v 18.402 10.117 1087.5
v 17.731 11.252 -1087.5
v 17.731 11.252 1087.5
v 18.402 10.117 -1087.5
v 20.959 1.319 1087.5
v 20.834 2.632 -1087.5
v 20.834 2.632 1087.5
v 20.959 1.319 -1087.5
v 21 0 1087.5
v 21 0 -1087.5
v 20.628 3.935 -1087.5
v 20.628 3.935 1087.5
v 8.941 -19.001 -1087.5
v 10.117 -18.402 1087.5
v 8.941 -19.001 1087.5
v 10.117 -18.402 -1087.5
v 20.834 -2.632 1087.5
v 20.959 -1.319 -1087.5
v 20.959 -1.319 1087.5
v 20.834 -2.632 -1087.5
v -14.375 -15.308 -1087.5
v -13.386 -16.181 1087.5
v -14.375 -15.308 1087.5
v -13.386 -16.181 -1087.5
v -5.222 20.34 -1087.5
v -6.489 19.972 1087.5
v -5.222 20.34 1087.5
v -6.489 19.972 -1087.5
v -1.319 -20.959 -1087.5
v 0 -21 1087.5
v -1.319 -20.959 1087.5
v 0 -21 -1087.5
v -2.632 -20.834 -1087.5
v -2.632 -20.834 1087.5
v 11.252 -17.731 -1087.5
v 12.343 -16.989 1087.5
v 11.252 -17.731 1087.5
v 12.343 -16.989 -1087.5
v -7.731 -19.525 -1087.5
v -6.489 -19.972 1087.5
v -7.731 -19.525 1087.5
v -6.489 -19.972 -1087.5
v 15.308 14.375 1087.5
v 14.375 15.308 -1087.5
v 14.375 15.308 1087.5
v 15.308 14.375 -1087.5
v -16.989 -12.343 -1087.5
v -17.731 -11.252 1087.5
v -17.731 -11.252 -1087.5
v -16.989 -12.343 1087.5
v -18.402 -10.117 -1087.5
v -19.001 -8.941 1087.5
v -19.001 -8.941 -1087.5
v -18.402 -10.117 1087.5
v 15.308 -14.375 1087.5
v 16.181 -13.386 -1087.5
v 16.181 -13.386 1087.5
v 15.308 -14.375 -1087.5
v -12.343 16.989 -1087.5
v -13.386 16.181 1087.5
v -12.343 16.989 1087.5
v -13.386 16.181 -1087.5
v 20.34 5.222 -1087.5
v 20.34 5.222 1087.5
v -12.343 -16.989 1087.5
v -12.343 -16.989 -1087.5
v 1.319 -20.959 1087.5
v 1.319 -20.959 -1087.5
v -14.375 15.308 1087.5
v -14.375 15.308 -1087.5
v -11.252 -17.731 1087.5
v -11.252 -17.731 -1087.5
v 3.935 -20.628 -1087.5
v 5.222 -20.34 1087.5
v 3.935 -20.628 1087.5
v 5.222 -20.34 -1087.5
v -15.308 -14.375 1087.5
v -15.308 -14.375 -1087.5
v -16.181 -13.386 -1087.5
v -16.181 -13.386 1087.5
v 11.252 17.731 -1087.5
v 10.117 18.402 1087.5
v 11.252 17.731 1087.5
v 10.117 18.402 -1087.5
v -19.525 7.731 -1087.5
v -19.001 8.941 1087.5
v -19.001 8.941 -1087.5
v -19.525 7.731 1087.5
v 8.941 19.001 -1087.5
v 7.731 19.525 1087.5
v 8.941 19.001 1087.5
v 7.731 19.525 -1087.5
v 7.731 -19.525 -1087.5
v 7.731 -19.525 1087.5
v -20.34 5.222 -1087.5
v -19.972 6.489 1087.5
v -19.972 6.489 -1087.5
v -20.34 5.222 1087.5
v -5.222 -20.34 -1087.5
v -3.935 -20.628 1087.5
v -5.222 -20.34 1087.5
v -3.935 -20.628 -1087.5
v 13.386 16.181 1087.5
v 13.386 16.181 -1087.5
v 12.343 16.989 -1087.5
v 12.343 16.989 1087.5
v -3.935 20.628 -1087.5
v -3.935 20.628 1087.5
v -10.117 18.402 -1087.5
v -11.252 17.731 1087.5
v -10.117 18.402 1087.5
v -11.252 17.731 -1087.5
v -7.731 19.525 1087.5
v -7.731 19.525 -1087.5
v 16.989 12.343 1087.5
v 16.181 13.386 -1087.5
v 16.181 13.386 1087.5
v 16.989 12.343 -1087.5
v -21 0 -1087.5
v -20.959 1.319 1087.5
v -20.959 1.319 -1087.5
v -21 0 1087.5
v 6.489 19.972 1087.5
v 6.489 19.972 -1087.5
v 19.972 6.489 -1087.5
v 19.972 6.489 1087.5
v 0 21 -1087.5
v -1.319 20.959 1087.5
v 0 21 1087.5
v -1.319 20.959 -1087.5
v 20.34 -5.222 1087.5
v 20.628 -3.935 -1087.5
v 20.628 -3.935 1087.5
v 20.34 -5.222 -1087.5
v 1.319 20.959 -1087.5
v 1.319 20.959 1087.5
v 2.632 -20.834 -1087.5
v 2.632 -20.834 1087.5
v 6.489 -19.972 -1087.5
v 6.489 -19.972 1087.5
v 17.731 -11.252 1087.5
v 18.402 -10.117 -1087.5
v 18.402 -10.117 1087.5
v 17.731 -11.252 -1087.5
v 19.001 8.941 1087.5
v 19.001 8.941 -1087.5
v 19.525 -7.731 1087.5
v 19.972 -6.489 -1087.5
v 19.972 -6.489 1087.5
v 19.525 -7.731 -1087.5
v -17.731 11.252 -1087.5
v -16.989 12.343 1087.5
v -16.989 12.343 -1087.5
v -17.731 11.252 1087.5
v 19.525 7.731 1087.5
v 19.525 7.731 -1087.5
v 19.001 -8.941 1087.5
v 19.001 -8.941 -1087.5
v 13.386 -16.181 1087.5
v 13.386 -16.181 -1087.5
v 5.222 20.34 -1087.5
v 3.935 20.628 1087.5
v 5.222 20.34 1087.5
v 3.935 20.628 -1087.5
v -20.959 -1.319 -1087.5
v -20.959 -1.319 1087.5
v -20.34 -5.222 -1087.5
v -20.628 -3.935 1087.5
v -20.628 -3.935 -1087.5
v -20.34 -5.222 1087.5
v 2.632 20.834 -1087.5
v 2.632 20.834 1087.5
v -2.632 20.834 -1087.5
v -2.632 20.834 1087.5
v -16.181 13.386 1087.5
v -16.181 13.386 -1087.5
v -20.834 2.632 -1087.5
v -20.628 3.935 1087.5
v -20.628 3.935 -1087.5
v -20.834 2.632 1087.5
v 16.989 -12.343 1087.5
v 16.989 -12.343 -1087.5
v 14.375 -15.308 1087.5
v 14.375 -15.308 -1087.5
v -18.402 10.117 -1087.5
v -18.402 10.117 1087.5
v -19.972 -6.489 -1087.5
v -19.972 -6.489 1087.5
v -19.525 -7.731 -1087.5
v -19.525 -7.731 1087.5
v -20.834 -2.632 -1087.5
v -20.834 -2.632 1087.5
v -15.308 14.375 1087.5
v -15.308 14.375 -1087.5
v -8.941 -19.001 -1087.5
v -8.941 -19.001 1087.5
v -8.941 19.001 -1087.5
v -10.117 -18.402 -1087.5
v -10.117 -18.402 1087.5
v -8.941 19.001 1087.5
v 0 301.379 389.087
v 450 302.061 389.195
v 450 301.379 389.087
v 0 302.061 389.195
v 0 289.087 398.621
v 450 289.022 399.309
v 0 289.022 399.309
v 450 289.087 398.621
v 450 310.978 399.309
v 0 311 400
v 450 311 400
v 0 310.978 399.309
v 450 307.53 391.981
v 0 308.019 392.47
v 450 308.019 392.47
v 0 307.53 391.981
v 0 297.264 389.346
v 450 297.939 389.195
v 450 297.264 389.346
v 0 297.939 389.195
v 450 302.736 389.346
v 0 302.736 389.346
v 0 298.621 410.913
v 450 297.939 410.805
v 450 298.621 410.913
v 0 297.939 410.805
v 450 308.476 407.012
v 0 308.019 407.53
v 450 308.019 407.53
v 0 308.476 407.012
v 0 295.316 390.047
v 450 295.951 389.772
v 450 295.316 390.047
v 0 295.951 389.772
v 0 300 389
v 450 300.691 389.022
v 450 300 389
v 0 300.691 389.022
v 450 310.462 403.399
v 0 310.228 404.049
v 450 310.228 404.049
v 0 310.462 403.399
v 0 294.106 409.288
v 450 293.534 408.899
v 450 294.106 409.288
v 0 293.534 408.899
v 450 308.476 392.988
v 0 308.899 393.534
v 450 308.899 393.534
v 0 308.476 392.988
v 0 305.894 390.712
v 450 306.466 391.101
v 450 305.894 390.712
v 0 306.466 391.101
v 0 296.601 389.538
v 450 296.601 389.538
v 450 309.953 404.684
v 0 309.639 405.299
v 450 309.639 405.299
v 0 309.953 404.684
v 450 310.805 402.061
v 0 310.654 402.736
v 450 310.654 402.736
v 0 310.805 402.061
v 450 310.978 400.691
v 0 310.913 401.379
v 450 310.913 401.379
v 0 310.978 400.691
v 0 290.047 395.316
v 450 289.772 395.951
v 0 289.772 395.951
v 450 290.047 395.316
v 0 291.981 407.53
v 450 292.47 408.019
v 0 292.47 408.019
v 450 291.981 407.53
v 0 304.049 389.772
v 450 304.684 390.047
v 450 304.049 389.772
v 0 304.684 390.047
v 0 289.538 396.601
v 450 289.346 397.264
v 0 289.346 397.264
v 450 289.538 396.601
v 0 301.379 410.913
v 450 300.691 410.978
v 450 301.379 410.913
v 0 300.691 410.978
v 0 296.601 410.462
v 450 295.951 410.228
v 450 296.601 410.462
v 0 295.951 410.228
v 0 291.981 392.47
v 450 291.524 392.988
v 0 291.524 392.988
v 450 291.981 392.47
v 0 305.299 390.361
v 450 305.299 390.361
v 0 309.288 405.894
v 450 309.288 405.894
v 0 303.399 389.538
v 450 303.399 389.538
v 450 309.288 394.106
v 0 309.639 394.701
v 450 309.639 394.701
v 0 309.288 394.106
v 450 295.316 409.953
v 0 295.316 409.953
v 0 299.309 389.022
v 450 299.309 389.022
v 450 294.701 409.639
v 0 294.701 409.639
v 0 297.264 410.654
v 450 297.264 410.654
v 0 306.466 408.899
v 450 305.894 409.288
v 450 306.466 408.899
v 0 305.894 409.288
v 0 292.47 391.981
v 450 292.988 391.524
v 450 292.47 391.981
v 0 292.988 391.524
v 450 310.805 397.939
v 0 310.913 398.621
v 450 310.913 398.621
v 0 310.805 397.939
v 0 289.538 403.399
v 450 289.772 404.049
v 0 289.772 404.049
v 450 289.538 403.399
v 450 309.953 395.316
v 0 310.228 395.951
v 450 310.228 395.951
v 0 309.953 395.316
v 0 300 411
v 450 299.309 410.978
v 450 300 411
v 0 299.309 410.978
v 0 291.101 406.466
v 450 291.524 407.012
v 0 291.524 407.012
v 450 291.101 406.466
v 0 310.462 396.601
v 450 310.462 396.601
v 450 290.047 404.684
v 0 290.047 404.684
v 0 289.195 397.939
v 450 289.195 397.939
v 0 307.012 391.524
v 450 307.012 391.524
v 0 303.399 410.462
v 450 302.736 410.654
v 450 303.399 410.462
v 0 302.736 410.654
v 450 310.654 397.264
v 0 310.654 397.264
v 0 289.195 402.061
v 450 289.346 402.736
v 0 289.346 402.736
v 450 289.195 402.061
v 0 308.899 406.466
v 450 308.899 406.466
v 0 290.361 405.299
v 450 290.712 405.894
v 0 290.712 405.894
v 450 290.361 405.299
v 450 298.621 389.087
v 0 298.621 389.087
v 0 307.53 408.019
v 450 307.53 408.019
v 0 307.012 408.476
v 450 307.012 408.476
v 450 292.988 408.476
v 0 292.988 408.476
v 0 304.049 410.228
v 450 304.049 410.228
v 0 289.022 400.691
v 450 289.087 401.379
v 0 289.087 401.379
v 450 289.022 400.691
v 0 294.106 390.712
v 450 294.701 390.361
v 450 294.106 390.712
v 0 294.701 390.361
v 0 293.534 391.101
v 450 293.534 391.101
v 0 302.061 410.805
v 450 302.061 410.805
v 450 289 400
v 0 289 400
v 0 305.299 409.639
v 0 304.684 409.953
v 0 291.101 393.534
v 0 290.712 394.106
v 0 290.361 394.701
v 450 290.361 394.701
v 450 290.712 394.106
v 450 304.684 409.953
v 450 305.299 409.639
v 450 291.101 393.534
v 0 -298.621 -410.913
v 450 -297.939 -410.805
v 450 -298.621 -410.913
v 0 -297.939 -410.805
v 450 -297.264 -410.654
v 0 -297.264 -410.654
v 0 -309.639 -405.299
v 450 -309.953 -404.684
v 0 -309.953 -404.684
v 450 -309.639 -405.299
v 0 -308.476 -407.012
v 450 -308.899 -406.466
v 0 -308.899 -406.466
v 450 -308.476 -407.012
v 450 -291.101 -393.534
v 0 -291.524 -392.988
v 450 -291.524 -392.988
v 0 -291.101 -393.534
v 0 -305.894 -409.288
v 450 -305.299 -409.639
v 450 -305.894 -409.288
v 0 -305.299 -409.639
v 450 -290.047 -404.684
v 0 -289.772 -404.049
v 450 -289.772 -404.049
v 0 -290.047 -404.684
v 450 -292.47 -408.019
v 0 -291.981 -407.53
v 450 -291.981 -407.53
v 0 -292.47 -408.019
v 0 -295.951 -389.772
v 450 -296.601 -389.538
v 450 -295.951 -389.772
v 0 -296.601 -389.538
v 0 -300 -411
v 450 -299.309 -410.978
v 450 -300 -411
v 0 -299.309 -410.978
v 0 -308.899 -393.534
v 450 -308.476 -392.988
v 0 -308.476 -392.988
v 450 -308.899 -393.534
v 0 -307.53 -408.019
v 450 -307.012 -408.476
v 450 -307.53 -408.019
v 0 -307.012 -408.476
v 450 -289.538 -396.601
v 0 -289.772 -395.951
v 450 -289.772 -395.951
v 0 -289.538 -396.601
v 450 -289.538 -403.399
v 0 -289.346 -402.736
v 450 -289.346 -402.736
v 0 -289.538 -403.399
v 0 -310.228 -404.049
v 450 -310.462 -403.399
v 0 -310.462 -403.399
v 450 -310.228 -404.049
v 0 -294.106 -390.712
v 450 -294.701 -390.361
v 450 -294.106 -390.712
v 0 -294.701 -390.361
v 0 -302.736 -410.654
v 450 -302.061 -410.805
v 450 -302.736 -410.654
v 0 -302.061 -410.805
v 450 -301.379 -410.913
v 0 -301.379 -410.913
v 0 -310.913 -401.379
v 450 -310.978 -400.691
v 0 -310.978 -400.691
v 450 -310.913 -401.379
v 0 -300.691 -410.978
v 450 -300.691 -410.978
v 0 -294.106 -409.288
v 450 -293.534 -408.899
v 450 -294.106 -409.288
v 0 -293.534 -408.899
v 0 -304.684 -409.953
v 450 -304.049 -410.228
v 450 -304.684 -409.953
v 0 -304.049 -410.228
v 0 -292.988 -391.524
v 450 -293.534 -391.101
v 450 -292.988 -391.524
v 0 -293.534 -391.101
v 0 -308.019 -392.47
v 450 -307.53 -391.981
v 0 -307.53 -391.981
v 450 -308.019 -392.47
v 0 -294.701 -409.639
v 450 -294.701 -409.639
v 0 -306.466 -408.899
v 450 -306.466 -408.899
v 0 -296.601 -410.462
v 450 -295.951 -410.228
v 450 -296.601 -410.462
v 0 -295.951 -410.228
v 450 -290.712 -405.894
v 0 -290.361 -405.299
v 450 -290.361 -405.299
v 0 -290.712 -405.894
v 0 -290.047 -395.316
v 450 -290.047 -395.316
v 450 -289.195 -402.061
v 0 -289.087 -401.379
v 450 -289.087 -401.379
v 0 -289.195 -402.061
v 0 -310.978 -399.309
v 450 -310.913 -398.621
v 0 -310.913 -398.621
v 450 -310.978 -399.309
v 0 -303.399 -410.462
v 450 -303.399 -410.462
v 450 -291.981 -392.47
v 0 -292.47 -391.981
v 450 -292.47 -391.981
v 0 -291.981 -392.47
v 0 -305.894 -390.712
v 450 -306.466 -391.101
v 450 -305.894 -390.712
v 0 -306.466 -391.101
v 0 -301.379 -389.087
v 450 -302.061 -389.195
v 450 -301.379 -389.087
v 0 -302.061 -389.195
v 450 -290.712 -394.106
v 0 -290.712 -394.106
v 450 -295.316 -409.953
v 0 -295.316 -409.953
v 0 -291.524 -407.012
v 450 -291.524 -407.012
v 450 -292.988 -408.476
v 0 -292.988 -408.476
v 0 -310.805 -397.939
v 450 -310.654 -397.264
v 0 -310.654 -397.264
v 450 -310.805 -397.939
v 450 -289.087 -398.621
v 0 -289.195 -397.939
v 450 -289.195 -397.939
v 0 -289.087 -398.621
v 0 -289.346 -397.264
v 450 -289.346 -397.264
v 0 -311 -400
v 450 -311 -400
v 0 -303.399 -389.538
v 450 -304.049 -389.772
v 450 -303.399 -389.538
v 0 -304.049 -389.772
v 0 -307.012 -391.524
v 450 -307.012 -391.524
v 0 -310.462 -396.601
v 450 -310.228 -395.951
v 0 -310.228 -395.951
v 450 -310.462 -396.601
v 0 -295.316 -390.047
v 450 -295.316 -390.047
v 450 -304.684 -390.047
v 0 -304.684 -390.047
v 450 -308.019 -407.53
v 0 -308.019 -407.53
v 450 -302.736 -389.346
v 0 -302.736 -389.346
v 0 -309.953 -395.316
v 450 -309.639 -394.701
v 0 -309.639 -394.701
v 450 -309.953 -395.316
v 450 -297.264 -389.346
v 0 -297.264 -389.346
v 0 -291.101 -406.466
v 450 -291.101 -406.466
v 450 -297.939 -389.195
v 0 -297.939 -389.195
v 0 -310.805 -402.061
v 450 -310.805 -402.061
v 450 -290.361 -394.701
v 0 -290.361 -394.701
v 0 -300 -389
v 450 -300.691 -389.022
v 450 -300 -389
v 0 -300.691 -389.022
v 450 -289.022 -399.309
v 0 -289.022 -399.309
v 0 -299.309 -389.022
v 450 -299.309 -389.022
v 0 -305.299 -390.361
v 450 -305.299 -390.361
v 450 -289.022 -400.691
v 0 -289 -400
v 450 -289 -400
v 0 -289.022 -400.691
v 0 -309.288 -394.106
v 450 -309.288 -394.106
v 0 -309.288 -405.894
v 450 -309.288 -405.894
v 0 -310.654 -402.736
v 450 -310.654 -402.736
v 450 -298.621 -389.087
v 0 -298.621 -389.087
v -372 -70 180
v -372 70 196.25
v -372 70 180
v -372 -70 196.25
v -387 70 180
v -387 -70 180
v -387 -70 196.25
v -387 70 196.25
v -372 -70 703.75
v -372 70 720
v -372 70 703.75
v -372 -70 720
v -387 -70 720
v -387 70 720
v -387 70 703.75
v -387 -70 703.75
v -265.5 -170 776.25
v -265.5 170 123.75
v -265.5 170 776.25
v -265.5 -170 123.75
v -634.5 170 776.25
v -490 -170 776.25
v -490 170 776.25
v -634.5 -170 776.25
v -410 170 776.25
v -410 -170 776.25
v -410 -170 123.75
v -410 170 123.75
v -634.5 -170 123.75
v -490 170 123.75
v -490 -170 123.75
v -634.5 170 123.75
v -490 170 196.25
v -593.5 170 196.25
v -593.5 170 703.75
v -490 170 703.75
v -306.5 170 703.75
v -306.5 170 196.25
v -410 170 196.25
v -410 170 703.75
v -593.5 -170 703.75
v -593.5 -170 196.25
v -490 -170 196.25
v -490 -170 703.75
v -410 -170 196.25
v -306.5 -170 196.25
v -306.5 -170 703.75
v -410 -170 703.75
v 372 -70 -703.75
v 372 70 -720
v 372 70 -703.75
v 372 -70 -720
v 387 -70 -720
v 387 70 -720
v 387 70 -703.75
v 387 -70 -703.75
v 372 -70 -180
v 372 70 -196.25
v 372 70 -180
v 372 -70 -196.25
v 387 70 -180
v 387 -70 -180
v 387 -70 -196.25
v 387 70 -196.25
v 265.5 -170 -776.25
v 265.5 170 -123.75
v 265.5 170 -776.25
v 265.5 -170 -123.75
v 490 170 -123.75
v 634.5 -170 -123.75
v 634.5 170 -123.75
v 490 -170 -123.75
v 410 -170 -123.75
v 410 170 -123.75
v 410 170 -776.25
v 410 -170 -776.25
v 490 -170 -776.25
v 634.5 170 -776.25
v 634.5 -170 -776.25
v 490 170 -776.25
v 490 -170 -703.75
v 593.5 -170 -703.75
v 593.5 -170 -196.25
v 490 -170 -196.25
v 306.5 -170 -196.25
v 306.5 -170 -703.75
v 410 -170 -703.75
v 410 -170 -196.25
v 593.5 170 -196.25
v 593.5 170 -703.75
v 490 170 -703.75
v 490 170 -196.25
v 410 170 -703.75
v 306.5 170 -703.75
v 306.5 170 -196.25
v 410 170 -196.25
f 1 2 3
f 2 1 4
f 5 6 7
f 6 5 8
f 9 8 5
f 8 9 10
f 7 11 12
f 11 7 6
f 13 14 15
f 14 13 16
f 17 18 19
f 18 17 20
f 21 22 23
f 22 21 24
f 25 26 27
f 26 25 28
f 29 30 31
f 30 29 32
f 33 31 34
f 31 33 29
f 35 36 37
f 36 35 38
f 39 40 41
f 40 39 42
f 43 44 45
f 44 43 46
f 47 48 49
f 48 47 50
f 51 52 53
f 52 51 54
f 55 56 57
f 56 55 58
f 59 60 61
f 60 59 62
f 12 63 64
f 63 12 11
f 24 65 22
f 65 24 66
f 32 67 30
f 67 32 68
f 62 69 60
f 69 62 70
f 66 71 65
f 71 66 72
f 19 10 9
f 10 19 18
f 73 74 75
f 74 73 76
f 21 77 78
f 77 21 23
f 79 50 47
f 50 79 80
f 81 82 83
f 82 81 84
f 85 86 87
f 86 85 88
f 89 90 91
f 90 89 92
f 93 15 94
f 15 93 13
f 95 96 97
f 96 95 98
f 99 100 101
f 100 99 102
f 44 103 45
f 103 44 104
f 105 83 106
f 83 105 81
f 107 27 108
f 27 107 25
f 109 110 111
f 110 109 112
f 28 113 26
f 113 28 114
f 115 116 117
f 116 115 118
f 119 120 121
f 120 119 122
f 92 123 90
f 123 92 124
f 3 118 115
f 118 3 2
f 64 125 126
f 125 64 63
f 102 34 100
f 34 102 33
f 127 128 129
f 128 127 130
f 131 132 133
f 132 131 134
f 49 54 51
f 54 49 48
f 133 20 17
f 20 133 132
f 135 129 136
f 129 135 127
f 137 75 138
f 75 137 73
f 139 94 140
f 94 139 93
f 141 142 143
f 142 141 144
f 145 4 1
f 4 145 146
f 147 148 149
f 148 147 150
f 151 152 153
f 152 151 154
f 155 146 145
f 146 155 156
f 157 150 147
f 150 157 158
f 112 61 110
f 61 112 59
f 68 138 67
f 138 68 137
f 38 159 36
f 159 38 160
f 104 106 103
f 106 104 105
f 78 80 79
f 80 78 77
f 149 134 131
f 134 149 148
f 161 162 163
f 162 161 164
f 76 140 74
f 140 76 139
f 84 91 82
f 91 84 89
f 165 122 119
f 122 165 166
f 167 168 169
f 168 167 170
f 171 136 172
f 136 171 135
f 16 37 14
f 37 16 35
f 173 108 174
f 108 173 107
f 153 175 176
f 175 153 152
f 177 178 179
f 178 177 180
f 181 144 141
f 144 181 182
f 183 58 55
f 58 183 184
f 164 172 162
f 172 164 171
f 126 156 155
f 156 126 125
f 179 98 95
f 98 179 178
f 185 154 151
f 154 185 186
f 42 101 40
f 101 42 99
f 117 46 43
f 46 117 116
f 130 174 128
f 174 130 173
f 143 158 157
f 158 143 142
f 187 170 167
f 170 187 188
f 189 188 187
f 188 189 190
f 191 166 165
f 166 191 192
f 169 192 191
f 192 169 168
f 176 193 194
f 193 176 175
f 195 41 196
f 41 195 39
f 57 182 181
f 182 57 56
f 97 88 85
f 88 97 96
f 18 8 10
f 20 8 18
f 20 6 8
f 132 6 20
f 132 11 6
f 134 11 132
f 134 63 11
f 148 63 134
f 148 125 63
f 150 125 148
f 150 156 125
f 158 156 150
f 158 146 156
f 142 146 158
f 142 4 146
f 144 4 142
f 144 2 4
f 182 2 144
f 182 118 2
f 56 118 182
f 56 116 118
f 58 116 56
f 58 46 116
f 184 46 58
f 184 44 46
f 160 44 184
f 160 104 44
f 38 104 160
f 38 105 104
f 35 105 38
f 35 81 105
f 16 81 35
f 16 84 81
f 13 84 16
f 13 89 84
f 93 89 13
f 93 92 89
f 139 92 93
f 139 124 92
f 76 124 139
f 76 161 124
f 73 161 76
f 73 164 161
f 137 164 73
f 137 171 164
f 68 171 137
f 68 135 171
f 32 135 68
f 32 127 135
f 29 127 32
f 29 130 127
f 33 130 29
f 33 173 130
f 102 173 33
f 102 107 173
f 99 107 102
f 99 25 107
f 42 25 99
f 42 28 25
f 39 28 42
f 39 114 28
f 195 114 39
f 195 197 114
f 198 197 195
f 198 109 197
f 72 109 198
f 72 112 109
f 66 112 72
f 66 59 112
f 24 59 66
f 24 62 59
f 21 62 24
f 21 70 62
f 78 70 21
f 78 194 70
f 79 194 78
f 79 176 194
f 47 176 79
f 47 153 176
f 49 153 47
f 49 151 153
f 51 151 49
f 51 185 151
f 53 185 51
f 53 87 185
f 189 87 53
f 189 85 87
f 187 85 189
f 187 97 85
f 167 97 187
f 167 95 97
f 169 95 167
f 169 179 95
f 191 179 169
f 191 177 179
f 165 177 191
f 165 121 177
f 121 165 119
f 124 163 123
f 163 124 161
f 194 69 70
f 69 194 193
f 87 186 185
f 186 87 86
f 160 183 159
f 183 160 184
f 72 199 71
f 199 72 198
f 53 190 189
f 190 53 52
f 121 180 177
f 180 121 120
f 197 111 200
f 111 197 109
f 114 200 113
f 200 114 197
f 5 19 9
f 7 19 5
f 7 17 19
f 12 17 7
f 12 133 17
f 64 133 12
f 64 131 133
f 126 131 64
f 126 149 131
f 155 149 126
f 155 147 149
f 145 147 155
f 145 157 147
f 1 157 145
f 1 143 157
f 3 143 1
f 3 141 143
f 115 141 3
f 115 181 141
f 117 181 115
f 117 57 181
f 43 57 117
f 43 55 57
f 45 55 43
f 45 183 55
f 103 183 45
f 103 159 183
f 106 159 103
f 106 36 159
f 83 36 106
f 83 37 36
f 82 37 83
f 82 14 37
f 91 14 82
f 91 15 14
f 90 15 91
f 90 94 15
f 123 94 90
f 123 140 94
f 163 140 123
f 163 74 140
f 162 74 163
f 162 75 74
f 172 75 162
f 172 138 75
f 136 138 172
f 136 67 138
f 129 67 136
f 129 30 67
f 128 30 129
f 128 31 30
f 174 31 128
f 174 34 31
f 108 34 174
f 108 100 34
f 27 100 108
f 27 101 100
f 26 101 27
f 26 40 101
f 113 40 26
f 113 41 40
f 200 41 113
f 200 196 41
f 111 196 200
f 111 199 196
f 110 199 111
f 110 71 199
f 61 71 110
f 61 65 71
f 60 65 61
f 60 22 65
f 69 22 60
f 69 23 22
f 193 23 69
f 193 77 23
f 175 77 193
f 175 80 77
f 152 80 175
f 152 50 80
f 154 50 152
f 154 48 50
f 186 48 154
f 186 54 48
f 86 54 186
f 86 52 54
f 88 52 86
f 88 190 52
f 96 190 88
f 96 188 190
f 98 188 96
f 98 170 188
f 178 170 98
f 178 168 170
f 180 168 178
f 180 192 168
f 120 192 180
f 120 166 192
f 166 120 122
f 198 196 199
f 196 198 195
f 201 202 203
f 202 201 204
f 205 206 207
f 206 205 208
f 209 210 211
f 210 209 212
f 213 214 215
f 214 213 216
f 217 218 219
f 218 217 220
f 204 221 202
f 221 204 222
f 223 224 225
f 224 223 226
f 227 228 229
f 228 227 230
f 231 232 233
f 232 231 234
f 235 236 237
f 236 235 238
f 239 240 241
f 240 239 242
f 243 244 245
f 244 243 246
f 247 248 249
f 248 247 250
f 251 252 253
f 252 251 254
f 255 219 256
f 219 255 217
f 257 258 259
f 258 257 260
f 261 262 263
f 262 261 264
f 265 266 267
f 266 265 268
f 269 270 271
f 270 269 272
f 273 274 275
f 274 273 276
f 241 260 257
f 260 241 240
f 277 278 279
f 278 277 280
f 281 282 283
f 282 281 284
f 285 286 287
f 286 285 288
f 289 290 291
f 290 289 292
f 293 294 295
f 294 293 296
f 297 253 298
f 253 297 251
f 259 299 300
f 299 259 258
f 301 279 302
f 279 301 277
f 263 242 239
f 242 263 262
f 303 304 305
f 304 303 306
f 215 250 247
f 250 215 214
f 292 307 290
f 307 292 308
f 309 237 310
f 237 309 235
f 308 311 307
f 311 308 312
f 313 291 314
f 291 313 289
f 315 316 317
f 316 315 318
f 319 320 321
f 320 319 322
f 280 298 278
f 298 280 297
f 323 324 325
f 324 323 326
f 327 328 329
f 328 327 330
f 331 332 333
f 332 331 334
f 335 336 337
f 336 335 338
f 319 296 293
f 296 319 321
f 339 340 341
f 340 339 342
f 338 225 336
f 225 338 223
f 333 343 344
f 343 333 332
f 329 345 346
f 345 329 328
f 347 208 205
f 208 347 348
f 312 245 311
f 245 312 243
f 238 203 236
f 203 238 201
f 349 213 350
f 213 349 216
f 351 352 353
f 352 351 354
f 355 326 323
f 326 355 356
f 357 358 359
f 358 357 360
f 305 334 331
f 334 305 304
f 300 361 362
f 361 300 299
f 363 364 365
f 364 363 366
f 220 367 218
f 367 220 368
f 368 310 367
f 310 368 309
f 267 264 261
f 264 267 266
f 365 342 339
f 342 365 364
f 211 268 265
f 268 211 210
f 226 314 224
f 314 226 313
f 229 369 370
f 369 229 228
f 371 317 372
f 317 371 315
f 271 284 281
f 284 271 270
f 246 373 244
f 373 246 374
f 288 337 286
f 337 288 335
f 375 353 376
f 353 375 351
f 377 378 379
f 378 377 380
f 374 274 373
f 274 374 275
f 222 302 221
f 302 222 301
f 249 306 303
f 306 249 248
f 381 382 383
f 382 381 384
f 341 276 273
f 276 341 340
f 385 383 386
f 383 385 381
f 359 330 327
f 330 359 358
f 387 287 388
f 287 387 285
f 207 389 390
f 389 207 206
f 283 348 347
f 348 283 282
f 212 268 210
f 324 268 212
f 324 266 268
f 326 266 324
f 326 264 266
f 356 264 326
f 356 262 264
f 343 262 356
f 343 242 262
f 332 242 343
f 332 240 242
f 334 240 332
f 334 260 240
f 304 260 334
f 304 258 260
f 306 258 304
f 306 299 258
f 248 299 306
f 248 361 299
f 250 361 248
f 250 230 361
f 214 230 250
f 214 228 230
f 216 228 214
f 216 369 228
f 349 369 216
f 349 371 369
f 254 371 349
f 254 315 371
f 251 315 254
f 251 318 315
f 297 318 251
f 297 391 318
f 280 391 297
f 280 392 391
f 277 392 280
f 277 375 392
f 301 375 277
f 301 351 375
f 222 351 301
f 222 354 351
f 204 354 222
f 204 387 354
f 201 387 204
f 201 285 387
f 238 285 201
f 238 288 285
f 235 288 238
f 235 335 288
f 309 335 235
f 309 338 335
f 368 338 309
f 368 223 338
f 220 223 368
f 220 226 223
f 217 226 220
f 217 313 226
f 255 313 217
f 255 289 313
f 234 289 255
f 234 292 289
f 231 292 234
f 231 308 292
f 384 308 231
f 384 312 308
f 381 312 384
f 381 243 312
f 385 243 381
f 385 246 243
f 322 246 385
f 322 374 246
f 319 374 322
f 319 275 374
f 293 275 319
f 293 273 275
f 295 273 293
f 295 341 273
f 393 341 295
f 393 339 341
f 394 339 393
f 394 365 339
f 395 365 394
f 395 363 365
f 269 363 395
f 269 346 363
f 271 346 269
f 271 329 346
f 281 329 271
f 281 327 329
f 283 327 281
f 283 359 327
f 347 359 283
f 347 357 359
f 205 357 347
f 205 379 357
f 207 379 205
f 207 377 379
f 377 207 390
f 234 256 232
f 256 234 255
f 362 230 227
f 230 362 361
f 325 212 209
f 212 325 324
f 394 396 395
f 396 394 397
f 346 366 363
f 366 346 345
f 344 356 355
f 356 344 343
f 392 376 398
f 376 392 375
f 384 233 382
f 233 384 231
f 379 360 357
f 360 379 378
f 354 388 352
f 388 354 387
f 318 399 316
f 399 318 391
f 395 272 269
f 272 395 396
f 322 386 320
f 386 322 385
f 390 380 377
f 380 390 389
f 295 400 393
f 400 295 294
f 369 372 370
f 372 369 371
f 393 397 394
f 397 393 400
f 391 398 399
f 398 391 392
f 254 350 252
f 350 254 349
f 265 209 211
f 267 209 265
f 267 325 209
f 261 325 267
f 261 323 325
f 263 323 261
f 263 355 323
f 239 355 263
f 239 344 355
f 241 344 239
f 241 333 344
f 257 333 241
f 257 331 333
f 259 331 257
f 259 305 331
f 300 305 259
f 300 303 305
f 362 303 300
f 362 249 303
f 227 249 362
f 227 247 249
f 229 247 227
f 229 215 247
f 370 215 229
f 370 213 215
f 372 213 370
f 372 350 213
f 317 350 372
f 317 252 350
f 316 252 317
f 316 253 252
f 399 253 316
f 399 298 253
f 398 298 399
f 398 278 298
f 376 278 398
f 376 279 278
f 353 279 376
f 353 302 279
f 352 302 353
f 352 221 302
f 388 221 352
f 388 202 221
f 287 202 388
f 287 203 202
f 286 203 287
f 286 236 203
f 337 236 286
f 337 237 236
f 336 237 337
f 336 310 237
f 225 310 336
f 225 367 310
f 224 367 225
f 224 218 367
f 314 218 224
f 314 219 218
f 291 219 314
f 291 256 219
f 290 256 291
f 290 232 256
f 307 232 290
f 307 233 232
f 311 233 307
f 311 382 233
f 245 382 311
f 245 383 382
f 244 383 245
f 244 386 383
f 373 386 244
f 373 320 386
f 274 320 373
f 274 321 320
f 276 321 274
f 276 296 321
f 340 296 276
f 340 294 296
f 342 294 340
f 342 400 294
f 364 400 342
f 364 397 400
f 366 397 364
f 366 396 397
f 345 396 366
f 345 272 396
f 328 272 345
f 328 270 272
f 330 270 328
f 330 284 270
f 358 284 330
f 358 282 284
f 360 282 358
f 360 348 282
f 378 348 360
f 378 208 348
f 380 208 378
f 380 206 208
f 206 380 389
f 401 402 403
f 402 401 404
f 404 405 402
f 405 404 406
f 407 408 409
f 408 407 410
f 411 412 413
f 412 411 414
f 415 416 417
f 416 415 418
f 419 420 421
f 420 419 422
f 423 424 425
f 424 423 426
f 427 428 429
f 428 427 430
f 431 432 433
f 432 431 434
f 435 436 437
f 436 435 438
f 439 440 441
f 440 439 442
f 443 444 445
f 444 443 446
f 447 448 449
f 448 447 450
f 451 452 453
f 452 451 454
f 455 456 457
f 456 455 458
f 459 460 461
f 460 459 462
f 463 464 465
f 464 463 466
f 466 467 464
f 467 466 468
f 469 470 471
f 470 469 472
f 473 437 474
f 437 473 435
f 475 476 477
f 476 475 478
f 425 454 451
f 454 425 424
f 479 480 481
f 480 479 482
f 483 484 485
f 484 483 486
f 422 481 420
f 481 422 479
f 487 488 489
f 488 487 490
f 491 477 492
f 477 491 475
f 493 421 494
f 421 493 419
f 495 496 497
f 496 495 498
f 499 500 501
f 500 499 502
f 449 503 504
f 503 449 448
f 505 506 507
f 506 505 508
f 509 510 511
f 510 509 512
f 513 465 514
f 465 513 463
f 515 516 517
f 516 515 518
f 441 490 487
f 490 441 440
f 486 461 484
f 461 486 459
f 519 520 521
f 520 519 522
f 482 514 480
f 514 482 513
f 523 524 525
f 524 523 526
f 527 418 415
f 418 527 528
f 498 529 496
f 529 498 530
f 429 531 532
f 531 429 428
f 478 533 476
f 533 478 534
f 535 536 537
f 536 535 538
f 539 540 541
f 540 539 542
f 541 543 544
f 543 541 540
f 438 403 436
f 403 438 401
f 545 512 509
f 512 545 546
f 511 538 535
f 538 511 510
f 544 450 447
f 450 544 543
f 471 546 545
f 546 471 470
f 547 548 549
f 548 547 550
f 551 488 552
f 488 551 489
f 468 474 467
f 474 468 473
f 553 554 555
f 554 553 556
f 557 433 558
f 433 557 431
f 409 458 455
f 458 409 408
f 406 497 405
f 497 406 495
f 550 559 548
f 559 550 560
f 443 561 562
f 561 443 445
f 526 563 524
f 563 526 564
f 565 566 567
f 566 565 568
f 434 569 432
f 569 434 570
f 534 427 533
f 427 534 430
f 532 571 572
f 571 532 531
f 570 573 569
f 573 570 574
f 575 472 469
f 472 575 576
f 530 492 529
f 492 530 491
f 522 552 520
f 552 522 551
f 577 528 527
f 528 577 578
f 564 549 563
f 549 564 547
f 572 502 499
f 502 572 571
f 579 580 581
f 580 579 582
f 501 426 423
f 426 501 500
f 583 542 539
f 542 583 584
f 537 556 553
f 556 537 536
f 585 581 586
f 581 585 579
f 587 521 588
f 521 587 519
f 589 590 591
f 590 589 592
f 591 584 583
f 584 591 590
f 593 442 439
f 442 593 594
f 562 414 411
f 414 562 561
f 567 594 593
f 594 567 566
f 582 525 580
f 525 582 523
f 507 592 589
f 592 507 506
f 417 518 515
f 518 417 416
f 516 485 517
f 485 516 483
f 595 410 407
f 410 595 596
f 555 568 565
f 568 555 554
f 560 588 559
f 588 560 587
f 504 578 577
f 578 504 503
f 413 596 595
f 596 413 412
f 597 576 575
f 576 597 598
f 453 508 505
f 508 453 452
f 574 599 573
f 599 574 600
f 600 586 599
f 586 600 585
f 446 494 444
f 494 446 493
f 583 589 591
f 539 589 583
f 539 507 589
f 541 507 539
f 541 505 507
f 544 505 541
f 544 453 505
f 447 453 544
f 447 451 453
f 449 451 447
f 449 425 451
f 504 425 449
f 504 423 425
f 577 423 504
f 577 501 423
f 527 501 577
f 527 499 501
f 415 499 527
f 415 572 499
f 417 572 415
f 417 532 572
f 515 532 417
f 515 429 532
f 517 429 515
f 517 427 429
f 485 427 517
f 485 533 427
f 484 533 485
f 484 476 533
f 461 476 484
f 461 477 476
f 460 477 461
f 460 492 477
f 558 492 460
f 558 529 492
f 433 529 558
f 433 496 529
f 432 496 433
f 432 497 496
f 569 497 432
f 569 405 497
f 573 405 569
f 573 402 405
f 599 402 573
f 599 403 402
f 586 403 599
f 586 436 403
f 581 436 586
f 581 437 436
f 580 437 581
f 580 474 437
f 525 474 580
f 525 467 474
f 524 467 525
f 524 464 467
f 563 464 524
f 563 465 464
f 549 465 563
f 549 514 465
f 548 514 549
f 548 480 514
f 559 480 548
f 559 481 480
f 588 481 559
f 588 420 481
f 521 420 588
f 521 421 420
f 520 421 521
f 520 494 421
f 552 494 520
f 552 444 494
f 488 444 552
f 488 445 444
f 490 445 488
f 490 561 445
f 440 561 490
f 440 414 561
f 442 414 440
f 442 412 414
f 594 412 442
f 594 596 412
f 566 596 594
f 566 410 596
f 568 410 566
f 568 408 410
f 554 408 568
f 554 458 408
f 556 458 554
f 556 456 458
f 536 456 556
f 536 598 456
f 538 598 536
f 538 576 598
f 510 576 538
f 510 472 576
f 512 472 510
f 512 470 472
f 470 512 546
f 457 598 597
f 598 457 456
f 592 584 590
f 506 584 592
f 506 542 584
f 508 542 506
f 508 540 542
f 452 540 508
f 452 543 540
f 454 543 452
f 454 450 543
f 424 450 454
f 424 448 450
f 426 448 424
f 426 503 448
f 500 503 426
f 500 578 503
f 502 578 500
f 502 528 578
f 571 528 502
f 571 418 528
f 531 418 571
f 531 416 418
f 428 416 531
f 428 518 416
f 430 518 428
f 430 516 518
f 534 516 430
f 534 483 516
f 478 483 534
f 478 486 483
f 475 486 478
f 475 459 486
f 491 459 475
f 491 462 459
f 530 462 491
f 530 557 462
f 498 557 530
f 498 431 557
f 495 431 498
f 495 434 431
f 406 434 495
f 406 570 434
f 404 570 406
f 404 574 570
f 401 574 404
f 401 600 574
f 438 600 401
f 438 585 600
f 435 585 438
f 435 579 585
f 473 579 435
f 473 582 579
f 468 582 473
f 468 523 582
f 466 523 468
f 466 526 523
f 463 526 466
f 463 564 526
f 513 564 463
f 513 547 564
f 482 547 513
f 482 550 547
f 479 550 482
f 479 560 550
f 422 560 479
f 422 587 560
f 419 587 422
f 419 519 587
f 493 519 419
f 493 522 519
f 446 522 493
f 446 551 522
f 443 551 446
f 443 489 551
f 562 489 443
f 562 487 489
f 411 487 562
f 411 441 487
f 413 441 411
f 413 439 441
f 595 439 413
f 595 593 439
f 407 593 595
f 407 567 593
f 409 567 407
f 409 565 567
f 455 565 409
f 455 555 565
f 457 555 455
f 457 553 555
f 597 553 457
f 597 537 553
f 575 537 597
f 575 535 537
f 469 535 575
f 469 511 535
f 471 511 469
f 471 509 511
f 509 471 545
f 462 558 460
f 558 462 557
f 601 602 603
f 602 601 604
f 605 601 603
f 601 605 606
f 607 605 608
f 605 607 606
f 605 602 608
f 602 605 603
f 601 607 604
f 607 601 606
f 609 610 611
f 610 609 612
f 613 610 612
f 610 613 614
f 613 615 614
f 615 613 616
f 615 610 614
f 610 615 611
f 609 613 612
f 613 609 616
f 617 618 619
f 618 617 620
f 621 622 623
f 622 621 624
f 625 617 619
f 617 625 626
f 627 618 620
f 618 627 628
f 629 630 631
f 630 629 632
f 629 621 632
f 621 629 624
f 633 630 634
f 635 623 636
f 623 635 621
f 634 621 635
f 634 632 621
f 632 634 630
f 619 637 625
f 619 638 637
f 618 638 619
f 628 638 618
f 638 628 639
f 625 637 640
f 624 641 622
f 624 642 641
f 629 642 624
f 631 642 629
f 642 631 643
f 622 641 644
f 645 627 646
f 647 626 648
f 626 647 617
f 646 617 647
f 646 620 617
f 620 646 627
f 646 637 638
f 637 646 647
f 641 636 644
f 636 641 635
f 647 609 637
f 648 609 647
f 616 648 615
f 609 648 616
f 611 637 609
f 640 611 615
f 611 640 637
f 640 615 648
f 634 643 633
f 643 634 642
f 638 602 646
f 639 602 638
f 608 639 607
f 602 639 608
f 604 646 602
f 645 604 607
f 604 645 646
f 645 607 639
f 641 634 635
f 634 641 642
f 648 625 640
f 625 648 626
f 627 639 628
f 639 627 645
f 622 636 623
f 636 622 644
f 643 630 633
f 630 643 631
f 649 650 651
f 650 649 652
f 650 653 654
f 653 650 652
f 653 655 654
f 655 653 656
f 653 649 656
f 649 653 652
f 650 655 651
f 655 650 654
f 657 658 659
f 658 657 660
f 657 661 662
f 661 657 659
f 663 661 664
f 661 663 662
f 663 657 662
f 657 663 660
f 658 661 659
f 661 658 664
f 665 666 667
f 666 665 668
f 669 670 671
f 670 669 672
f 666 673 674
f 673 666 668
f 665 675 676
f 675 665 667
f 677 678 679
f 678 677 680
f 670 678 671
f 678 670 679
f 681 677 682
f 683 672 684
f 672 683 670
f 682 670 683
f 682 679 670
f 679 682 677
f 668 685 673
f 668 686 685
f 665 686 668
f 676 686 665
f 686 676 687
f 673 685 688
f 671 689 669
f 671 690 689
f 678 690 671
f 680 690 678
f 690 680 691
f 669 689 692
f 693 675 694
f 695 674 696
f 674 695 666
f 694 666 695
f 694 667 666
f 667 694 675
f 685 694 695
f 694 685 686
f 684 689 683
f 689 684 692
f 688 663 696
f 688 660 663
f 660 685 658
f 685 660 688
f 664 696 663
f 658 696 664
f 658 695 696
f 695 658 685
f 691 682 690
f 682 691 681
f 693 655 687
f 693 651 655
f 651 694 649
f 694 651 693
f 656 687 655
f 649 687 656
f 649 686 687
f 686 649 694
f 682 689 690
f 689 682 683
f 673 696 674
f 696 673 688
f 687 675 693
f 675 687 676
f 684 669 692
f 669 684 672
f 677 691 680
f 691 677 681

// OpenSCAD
// ============================================================================
// PROJECT: XXXG-00W0 WING GUNDAM ZERO EW - LOWER AIRFRAME PROTECTION
// COMPONENT VAULT: BANDAI CAST RUNNER G - PELVIC ANCHORS G19 & G20
// PACKAGING RE-ARCHITECTURE: SUB-ARMOR CAPACITOR RECESSED BANK INTEGRATION
// CONFIG METRIC: SCALED TITANIUM CASTS (1:1 ACTUAL METRIC UP-SCALE)
// ============================================================================

$fn = 100; // Circular segment rendering resolution count

// Structural Constants Scaled 1:1 for a 16.7-Meter Airframe Scale (mm)
pelvic_plate_length = 1450;             // Total longitudinal vertical height (mm)
pelvic_outer_width = 820;               // Transverse pelvic shell casing depth (mm)
armor_skin_thickness = 60;              // Solid TiAl protective plating wall (mm)
harness_conduit_width = 80;             // Cast-in 4oz copper logic trace track (mm)
capacitor_pocket_depth = 15;            // Sub-armor recessed housing pocket depth (mm)
capacitor_pocket_width = 140;           // Transverse MLCC array pocket width (mm)

module Runner_G_Pelvic_Anchor_Forge() {
    // Central Supply Injection Runner Axis (Molten Feed Line from Siphon Forge)
    color([0.22, 0.22, 0.25]) {
        cylinder(h = pelvic_plate_length * 1.5, d = 42, center = true);
        // Direct injection gates tracking straight into the part mold cavities
        translate([0, 300, 400]) rotate([0, 90, 0]) cylinder(h = 450, d = 22);
        translate([0, -300, -400]) rotate([0, 90, 0]) cylinder(h = 450, d = 22);
    }
    
    // Instantiate Scaled Skeutomorphic Part Molds Symmetrically (Left & Right)
    Cast_Internal_Pelvic_Anchors();
}

module Cast_Internal_Pelvic_Anchors() {
    // ---- PART G19: INTERNAL LEFT PELVIC LOAD PLATE ANCHOR ---- [Page 18, Step 09-1]
    translate([-450, 0, 450]) color([0.35, 0.35, 0.38]) { // Inner Frame Dark Spec
        difference() {
            // Main solid heavy-duty lower frame stabilization anchor block
            cube([pelvic_outer_width * 0.45, 340, pelvic_plate_length * 0.45], center = true);
            
            // Core structural cut out for internal backbone link mounting
            cube([pelvic_outer_width * 0.35, 360, pelvic_plate_length * 0.35], center = true);
            
            // SUB-ARMOR RECESSED CAPACITOR POCKETS [Segmented rows cut inside the anchor wall]
            for (z_offset = [-200, 0, 200]) {
                translate([(pelvic_outer_width * 0.15 - armor_skin_thickness + capacitor_pocket_depth/2), 0, z_offset])
                    cube([capacitor_pocket_depth, capacitor_pocket_width, 140], center = true);
            }
            
            // Continuous cast-in routing track for the 4oz solid-state wiring rails
            cube([harness_conduit_width, 360, pelvic_plate_length], center = true);
        }
    }
    
    // ---- PART G20: INTERNAL RIGHT PELVIC LOAD PLATE ANCHOR ---- [Page 18, Step 09-1]
    translate([450, 0, -450]) rotate([0, 0, 180]) color([0.35, 0.35, 0.38]) {
        difference() {
            cube([pelvic_outer_width * 0.45, 340, pelvic_plate_length * 0.45], center = true);
            cube([pelvic_outer_width * 0.35, 360, pelvic_plate_length * 0.35], center = true);
            
            for (z_offset = [-200, 0, 200]) {
                translate([(pelvic_outer_width * 0.15 - armor_skin_thickness + capacitor_pocket_depth/2), 0, z_offset])
                    cube([capacitor_pocket_depth, capacitor_pocket_width, 140], center = true);
            }
            
            cube([harness_conduit_width, 360, pelvic_plate_length], center = true);
        }
    }
}

// Render Master Assembly to Parameter Workspace
Runner_G_Pelvic_Anchor_Forge();
